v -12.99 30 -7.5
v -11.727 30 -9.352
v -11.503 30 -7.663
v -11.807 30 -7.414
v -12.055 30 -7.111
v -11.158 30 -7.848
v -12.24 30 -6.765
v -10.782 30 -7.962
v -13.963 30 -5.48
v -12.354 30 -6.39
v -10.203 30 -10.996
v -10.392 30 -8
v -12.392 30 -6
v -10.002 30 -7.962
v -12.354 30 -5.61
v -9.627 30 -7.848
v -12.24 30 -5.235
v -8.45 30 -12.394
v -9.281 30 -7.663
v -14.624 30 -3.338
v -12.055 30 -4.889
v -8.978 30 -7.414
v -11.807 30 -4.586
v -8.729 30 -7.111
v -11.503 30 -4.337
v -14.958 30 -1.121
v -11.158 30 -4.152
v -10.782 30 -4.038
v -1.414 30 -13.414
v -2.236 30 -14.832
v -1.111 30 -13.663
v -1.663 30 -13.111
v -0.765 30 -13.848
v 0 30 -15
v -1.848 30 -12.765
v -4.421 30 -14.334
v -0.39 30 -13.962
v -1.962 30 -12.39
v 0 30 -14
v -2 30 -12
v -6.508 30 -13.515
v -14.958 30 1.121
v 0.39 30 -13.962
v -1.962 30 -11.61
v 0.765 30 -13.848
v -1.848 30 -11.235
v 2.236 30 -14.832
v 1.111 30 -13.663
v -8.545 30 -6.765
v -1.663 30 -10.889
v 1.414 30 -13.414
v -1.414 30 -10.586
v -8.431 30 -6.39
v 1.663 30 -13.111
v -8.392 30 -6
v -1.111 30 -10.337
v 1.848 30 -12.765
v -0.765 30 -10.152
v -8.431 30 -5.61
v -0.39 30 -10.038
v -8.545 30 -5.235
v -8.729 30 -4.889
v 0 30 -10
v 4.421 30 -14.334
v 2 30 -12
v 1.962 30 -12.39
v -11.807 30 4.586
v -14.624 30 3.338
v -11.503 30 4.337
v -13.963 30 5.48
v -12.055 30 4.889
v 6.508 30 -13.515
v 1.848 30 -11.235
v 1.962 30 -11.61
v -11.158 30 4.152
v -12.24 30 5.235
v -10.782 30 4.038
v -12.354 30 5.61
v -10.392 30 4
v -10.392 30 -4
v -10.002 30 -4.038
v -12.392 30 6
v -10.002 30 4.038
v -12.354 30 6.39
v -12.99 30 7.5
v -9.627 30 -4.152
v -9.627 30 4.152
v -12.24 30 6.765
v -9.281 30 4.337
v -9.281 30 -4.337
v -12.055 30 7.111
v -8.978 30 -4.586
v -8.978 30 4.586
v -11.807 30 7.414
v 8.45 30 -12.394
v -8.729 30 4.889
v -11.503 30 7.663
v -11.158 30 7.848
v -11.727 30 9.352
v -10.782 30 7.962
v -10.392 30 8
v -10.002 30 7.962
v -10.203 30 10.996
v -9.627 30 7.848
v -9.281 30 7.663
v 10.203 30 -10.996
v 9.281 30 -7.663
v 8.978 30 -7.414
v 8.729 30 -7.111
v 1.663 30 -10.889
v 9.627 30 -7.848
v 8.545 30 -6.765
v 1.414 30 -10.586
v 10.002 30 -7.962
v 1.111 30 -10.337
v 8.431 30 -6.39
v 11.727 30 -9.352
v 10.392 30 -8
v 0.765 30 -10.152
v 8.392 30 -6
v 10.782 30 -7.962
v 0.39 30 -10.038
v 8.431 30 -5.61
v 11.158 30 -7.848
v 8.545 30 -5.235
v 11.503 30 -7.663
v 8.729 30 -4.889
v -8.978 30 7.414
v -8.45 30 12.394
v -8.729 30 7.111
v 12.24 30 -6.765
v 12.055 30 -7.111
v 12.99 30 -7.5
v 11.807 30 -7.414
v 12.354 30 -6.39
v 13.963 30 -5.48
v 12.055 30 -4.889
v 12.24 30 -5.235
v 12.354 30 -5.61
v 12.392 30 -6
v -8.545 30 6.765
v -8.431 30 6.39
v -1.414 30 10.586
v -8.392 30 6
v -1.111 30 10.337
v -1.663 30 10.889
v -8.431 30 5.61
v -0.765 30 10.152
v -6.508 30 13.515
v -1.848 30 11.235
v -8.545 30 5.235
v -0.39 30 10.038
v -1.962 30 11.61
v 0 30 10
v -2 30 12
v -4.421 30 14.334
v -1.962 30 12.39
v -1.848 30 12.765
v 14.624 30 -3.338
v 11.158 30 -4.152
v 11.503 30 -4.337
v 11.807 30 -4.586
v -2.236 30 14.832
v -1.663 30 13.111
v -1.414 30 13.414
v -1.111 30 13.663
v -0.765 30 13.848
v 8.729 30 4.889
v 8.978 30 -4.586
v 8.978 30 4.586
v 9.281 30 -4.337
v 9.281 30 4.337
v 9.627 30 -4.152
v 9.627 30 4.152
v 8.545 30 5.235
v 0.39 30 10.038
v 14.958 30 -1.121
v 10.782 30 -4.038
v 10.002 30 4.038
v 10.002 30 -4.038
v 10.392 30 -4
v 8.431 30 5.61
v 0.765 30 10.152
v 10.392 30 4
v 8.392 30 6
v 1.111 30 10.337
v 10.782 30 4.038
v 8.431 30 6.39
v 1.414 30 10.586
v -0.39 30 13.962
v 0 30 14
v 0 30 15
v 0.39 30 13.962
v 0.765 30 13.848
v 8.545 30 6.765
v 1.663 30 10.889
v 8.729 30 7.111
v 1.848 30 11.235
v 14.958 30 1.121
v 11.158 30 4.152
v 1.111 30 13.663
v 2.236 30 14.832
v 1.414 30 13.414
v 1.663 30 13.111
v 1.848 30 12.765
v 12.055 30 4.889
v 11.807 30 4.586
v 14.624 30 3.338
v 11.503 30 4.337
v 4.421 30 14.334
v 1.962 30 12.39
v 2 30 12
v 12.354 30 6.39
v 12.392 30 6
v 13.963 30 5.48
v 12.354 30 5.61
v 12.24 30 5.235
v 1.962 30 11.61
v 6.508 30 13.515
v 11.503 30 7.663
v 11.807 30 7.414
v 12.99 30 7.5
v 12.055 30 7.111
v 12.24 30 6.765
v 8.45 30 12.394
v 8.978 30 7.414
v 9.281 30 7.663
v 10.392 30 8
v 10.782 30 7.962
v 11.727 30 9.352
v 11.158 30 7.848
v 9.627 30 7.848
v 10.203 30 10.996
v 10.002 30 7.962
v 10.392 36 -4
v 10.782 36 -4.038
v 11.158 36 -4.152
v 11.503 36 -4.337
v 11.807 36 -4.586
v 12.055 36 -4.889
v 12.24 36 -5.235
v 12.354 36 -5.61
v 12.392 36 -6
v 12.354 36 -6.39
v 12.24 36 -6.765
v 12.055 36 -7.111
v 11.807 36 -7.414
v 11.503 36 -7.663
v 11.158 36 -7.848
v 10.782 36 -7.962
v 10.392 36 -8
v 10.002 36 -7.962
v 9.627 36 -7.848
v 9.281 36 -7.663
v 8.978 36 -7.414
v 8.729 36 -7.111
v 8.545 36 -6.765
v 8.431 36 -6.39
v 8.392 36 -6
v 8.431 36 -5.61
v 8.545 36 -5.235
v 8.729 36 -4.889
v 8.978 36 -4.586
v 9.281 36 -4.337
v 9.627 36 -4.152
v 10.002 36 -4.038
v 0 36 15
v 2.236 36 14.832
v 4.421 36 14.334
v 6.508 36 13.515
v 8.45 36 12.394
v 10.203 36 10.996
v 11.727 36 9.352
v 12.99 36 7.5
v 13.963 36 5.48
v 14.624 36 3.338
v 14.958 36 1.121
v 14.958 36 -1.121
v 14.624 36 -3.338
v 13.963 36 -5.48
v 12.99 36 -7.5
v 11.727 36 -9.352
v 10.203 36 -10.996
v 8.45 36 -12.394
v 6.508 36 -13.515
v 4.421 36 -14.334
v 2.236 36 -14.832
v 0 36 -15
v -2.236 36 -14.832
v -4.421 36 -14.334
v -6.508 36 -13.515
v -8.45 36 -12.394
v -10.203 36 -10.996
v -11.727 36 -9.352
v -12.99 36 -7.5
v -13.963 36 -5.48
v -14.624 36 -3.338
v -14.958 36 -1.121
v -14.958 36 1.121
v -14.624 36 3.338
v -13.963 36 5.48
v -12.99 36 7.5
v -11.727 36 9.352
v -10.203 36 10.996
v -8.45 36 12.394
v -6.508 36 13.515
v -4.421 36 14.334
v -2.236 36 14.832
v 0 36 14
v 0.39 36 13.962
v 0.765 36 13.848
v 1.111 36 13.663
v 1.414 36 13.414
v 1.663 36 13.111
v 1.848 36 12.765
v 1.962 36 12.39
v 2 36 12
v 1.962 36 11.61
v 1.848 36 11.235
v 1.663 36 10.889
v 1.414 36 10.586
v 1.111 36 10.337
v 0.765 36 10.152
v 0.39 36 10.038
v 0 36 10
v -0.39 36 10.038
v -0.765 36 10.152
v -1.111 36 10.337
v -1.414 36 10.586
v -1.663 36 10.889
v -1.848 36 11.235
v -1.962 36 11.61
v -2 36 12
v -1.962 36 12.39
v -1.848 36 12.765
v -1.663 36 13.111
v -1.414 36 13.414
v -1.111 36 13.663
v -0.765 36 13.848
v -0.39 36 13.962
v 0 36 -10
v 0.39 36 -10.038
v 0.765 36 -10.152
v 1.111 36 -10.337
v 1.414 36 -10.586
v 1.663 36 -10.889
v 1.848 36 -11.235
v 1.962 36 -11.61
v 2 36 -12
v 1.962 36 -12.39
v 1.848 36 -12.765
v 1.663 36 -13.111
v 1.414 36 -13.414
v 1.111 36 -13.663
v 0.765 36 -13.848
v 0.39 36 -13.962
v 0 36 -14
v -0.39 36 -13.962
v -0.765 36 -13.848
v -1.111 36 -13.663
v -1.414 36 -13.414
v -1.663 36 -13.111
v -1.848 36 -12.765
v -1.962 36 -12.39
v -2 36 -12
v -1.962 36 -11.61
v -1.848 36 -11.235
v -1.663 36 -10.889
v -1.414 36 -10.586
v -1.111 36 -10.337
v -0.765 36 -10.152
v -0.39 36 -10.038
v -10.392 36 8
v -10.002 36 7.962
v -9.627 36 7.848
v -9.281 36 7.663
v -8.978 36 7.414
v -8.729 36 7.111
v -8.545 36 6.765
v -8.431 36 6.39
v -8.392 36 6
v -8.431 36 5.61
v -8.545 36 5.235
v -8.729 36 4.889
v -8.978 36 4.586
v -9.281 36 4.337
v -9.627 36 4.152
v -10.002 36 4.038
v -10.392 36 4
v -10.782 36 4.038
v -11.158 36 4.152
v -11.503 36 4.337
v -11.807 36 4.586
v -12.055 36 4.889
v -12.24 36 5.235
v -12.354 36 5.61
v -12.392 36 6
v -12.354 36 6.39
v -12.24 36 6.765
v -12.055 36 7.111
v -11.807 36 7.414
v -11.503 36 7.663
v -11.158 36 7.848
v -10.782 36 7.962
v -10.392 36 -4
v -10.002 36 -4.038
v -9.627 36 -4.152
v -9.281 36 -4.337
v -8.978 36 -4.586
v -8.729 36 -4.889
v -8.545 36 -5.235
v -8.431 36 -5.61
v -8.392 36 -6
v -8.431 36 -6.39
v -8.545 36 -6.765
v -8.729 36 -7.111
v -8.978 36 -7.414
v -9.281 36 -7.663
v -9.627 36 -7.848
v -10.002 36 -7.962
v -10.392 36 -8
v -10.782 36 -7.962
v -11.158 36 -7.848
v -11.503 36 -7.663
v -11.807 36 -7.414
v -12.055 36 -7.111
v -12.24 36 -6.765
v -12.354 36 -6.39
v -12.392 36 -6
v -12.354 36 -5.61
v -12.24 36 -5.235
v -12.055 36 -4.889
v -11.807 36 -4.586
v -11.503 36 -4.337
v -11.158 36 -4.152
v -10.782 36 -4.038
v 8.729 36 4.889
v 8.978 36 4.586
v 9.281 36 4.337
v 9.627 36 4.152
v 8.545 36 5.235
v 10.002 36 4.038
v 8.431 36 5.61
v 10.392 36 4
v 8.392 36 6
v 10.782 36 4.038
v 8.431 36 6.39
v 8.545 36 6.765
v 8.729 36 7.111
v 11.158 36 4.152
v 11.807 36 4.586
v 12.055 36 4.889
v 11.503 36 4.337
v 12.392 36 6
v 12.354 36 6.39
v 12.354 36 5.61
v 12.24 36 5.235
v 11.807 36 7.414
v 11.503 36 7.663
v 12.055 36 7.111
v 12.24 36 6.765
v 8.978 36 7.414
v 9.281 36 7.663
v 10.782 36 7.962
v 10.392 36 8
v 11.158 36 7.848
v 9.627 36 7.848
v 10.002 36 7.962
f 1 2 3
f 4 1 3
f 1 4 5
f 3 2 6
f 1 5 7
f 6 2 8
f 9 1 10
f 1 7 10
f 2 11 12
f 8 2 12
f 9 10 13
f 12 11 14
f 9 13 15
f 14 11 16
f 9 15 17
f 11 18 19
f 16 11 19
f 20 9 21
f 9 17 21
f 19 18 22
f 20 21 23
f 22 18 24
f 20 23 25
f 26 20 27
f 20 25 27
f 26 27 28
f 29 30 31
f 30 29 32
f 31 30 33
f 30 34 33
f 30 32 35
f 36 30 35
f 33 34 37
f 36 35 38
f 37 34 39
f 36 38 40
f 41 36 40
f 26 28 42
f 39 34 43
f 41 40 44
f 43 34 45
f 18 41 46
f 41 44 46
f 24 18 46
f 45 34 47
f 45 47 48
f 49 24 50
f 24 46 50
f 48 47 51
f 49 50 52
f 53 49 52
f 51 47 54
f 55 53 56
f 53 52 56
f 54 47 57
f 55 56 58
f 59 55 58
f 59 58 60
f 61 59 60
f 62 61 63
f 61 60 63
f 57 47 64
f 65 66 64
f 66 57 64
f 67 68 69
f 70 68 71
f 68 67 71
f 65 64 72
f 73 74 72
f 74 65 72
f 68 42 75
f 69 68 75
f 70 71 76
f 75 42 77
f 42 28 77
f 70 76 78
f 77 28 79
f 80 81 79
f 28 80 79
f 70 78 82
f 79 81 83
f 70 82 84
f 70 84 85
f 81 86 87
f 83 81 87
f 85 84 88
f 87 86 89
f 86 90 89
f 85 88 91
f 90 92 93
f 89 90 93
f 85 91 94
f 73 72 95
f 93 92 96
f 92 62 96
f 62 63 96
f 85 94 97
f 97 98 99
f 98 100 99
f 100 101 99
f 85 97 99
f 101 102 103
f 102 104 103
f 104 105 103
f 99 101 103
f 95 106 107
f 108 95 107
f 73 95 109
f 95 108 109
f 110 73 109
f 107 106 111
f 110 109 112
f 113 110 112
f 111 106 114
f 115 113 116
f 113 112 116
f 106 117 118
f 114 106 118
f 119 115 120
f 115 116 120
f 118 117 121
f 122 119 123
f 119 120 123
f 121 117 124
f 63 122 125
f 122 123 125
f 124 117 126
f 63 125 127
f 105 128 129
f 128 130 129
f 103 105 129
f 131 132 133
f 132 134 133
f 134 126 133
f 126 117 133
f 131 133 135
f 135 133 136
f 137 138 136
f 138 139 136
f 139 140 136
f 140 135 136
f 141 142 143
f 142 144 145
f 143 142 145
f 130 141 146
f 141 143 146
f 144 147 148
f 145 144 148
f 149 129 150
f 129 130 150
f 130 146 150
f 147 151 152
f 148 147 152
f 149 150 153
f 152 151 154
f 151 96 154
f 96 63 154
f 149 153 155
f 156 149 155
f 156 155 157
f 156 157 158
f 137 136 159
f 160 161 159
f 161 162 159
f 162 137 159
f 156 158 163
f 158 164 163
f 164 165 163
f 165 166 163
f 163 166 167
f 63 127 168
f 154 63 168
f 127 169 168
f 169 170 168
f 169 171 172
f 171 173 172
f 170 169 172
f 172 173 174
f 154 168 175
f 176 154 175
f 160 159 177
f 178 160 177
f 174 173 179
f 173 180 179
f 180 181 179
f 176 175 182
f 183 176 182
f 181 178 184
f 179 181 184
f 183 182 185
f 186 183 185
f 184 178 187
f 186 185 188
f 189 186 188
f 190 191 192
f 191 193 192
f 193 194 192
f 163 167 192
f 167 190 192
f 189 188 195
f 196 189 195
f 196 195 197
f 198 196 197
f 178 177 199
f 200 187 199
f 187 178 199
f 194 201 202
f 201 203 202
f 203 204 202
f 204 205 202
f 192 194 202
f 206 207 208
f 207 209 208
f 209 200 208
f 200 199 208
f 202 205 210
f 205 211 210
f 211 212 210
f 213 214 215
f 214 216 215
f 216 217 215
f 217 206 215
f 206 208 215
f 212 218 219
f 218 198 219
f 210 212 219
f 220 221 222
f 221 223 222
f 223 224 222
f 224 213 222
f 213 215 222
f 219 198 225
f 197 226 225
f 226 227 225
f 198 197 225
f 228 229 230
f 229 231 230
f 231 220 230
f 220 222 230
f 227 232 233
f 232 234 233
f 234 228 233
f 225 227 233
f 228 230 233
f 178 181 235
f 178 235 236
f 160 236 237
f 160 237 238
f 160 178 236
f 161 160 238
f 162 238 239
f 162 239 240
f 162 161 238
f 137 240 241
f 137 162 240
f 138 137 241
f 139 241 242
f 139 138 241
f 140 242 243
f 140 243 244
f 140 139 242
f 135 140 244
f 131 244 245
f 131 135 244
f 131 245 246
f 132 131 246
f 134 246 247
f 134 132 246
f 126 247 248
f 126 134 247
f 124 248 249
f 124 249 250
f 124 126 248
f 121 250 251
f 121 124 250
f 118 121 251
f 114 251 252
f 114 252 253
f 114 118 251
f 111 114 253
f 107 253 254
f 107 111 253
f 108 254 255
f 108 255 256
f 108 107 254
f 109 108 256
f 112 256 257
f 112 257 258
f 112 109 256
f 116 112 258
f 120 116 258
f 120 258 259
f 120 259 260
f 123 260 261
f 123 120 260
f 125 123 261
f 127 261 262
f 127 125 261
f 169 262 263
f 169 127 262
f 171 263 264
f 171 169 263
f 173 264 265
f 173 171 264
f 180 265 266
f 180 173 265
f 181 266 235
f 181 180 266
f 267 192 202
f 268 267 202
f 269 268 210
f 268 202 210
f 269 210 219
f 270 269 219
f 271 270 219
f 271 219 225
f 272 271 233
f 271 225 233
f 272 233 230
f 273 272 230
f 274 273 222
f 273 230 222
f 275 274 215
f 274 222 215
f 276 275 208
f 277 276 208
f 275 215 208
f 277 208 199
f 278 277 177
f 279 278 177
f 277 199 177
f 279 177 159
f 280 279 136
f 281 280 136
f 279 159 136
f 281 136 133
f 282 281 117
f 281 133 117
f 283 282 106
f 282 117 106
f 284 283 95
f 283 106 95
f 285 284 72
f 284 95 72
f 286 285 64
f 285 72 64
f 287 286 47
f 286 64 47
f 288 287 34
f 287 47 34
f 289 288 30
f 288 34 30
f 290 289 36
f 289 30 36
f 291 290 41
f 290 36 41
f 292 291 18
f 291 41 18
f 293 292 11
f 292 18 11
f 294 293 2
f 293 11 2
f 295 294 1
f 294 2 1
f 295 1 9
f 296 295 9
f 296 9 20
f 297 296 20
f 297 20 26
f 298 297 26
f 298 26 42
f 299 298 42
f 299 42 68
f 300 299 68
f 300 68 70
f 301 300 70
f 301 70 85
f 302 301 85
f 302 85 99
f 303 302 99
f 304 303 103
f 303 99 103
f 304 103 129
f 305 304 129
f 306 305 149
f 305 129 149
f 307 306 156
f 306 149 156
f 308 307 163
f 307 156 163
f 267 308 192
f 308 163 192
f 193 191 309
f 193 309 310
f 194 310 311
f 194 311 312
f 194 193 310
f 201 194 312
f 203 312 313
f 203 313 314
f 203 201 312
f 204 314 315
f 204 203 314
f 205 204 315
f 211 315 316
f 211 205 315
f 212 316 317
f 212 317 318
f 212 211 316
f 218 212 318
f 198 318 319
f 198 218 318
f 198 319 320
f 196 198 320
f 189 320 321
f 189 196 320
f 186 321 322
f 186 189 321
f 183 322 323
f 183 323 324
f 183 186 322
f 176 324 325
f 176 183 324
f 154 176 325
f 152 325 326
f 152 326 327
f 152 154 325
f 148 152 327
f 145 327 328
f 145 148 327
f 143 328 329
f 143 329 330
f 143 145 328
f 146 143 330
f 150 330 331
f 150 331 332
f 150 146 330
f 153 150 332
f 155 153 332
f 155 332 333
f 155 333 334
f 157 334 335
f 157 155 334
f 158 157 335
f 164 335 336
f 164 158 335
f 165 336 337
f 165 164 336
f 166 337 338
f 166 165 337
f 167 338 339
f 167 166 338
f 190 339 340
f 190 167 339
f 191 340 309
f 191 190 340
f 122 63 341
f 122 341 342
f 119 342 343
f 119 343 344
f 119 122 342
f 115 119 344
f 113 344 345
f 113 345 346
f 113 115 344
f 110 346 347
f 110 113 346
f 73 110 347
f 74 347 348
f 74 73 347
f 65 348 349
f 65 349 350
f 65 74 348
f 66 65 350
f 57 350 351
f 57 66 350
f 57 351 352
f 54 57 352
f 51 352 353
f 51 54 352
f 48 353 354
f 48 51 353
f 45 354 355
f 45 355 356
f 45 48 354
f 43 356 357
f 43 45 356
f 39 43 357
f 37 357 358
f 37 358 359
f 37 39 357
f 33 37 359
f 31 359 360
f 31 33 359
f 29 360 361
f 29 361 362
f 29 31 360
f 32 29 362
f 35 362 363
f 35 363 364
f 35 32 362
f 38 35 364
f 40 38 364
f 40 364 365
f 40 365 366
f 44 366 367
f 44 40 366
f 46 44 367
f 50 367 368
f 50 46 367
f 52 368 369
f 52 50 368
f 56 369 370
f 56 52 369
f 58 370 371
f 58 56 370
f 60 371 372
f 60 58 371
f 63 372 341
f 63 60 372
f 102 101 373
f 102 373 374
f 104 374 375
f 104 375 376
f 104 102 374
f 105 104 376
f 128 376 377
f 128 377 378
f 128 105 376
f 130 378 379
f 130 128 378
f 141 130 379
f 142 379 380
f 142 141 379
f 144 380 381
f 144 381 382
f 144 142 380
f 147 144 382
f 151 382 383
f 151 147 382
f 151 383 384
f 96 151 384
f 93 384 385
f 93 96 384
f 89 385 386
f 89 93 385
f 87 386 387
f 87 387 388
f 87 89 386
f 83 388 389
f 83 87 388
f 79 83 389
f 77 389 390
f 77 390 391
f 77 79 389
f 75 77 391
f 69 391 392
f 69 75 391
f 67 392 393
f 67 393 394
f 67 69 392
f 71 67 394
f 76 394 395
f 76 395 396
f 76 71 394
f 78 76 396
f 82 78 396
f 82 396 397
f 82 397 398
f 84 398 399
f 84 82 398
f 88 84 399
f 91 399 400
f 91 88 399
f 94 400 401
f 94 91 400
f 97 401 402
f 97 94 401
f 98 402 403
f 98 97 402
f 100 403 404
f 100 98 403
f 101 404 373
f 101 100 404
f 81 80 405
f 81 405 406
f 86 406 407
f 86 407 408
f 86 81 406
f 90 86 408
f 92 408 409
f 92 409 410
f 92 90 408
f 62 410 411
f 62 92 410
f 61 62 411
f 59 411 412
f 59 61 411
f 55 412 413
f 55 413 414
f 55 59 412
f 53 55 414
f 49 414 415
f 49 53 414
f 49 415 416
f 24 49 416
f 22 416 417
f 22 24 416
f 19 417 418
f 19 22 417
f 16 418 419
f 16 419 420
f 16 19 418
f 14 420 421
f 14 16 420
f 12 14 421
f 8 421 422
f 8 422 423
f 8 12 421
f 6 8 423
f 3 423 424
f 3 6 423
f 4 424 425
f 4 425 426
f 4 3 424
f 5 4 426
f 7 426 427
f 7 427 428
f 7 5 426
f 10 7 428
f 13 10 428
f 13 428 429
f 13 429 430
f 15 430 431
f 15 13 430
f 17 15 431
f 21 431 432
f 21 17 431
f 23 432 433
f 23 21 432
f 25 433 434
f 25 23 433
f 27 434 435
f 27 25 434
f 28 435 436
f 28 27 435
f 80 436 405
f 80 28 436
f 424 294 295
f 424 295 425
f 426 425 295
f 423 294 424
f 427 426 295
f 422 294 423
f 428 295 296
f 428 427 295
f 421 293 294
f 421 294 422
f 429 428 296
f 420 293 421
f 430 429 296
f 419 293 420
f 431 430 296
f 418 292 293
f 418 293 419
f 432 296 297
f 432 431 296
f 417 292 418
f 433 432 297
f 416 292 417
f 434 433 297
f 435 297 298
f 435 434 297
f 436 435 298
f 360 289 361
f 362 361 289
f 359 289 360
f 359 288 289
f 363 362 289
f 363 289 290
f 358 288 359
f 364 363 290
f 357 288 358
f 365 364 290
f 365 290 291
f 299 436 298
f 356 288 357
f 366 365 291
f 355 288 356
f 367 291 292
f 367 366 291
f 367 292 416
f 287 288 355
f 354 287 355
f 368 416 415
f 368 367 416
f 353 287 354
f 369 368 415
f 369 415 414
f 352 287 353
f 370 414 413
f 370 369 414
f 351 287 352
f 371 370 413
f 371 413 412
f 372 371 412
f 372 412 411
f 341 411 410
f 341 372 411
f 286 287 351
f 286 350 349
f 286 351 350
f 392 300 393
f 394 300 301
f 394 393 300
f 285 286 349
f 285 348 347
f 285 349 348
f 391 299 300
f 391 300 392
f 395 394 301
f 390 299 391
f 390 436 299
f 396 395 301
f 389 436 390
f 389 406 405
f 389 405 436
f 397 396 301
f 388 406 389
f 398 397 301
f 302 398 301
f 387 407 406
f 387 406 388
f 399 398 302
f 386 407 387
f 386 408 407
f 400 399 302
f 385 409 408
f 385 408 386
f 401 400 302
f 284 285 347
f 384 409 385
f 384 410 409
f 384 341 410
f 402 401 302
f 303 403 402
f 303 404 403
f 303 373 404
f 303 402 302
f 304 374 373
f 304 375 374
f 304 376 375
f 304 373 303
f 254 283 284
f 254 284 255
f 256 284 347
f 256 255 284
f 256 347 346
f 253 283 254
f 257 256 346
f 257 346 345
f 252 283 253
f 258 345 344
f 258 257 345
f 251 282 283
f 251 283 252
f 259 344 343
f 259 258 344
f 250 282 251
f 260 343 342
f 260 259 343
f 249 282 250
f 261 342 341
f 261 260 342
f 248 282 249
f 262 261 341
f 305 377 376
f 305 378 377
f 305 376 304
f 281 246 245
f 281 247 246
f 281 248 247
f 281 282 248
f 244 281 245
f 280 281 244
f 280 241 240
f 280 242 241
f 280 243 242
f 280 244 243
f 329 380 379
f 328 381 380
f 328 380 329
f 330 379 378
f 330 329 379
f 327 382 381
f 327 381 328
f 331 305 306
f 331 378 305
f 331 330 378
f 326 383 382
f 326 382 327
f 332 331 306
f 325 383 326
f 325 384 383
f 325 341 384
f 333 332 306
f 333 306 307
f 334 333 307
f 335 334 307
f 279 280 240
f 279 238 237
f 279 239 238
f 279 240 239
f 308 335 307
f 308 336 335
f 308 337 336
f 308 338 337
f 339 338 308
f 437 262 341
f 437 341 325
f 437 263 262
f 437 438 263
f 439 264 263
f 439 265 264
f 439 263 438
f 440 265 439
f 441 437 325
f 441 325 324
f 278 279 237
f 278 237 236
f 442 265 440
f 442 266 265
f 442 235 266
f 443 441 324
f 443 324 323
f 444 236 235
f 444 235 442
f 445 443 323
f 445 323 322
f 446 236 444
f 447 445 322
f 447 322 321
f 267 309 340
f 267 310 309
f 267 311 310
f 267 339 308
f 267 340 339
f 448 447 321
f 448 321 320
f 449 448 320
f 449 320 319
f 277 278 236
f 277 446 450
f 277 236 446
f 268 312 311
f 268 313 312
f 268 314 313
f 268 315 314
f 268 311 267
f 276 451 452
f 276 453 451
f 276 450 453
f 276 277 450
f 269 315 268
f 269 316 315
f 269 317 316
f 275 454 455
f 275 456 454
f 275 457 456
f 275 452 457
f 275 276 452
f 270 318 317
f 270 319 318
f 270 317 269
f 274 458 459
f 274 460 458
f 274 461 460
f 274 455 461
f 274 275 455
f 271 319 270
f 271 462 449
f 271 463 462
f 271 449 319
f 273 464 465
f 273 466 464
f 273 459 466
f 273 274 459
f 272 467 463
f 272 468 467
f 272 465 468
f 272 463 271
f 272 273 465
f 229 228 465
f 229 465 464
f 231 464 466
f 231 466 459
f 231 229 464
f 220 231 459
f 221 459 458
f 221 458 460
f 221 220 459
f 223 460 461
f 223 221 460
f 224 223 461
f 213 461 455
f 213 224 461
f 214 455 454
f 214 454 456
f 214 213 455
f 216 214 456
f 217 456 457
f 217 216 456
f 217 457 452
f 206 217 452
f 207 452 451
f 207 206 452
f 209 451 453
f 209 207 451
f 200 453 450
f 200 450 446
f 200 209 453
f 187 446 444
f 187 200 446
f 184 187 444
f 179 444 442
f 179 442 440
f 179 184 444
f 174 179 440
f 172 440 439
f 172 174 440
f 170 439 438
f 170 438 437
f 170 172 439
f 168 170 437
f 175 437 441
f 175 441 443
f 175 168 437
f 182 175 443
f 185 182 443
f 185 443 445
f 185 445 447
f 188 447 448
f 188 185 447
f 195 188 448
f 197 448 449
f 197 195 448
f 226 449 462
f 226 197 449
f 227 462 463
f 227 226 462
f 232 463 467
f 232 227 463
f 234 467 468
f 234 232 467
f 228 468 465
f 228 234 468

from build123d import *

# Parameters (mm, degrees)
SKETCH1_R             = 15
BOSS_EXTRUDE1_DEPTH   = 30
SKETCH2_R             = 7
BOSS_EXTRUDE2_DEPTH   = 4
F_4_0MM_DOWEL_HOLE1_D = 4
CIRPATTERN1_COUNT     = 6
SKETCH6_R             = 15
SKETCH6_R_2           = 2
BOSS_EXTRUDE3_DEPTH   = 6


with BuildPart() as part:
    # Sketch1 → Boss-Extrude1 (new body)
    with BuildSketch(Plane(origin=(0, 0, 0), x_dir=(1, 0, 0), z_dir=(0, 1, 0))):
        with Locations(Location((0, 0, 0), (0, 0, 270))):
            Circle(SKETCH1_R)
    extrude(amount=BOSS_EXTRUDE1_DEPTH)

    # Sketch2 → Boss-Extrude2 (add)
    with BuildSketch(Plane.XZ):
        with Locations(Location((0, 0, 0), (0, 0, 270))):
            Circle(SKETCH2_R)
    extrude(amount=BOSS_EXTRUDE2_DEPTH)

    # Ø4.0mm Dowel Hole1 (through all)
    with Locations(Plane(origin=(0, 0, 0), x_dir=(-1, 0, 0), z_dir=(0, -1, 0))):
        with Locations((0, -12)):
            f_4_0mm_dowel_hole1 = Hole(F_4_0MM_DOWEL_HOLE1_D / 2)

    # CirPattern1: Ø4.0mm Dowel Hole1 ×6 about axis
    cirpattern1_axis = Axis((0, 0, 0), (0, 1, 0))
    for i in range(1, CIRPATTERN1_COUNT):
        add(f_4_0mm_dowel_hole1.rotate(cirpattern1_axis, i * 360 / CIRPATTERN1_COUNT), mode=Mode.SUBTRACT)


with BuildPart() as body_2:
    # Sketch6 → Boss-Extrude3 (new body)
    with BuildSketch(Plane(origin=(0, 30, 0), x_dir=(1, 0, 0), z_dir=(0, 1, 0))):
        with Locations(Location((0, 0, 0), (0, 0, 270))):
            Circle(SKETCH6_R)
        with Locations(Location((-10.392304845, 6, 0), (0, 0, 270))):
            Circle(SKETCH6_R_2, mode=Mode.SUBTRACT)
        with Locations(Location((-10.392304845, -6, 0), (0, 0, 270))):
            Circle(SKETCH6_R_2, mode=Mode.SUBTRACT)
        with Locations(Location((0, -12, 0), (0, 0, 270))):
            Circle(SKETCH6_R_2, mode=Mode.SUBTRACT)
        with Locations(Location((10.392304845, -6, 0), (0, 0, 270))):
            Circle(SKETCH6_R_2, mode=Mode.SUBTRACT)
        with Locations(Location((10.392304845, 6, 0), (0, 0, 270))):
            Circle(SKETCH6_R_2, mode=Mode.SUBTRACT)
        with Locations(Location((0, 12, 0), (0, 0, 270))):
            Circle(SKETCH6_R_2, mode=Mode.SUBTRACT)
    extrude(amount=BOSS_EXTRUDE3_DEPTH)


solid = body_2.part
